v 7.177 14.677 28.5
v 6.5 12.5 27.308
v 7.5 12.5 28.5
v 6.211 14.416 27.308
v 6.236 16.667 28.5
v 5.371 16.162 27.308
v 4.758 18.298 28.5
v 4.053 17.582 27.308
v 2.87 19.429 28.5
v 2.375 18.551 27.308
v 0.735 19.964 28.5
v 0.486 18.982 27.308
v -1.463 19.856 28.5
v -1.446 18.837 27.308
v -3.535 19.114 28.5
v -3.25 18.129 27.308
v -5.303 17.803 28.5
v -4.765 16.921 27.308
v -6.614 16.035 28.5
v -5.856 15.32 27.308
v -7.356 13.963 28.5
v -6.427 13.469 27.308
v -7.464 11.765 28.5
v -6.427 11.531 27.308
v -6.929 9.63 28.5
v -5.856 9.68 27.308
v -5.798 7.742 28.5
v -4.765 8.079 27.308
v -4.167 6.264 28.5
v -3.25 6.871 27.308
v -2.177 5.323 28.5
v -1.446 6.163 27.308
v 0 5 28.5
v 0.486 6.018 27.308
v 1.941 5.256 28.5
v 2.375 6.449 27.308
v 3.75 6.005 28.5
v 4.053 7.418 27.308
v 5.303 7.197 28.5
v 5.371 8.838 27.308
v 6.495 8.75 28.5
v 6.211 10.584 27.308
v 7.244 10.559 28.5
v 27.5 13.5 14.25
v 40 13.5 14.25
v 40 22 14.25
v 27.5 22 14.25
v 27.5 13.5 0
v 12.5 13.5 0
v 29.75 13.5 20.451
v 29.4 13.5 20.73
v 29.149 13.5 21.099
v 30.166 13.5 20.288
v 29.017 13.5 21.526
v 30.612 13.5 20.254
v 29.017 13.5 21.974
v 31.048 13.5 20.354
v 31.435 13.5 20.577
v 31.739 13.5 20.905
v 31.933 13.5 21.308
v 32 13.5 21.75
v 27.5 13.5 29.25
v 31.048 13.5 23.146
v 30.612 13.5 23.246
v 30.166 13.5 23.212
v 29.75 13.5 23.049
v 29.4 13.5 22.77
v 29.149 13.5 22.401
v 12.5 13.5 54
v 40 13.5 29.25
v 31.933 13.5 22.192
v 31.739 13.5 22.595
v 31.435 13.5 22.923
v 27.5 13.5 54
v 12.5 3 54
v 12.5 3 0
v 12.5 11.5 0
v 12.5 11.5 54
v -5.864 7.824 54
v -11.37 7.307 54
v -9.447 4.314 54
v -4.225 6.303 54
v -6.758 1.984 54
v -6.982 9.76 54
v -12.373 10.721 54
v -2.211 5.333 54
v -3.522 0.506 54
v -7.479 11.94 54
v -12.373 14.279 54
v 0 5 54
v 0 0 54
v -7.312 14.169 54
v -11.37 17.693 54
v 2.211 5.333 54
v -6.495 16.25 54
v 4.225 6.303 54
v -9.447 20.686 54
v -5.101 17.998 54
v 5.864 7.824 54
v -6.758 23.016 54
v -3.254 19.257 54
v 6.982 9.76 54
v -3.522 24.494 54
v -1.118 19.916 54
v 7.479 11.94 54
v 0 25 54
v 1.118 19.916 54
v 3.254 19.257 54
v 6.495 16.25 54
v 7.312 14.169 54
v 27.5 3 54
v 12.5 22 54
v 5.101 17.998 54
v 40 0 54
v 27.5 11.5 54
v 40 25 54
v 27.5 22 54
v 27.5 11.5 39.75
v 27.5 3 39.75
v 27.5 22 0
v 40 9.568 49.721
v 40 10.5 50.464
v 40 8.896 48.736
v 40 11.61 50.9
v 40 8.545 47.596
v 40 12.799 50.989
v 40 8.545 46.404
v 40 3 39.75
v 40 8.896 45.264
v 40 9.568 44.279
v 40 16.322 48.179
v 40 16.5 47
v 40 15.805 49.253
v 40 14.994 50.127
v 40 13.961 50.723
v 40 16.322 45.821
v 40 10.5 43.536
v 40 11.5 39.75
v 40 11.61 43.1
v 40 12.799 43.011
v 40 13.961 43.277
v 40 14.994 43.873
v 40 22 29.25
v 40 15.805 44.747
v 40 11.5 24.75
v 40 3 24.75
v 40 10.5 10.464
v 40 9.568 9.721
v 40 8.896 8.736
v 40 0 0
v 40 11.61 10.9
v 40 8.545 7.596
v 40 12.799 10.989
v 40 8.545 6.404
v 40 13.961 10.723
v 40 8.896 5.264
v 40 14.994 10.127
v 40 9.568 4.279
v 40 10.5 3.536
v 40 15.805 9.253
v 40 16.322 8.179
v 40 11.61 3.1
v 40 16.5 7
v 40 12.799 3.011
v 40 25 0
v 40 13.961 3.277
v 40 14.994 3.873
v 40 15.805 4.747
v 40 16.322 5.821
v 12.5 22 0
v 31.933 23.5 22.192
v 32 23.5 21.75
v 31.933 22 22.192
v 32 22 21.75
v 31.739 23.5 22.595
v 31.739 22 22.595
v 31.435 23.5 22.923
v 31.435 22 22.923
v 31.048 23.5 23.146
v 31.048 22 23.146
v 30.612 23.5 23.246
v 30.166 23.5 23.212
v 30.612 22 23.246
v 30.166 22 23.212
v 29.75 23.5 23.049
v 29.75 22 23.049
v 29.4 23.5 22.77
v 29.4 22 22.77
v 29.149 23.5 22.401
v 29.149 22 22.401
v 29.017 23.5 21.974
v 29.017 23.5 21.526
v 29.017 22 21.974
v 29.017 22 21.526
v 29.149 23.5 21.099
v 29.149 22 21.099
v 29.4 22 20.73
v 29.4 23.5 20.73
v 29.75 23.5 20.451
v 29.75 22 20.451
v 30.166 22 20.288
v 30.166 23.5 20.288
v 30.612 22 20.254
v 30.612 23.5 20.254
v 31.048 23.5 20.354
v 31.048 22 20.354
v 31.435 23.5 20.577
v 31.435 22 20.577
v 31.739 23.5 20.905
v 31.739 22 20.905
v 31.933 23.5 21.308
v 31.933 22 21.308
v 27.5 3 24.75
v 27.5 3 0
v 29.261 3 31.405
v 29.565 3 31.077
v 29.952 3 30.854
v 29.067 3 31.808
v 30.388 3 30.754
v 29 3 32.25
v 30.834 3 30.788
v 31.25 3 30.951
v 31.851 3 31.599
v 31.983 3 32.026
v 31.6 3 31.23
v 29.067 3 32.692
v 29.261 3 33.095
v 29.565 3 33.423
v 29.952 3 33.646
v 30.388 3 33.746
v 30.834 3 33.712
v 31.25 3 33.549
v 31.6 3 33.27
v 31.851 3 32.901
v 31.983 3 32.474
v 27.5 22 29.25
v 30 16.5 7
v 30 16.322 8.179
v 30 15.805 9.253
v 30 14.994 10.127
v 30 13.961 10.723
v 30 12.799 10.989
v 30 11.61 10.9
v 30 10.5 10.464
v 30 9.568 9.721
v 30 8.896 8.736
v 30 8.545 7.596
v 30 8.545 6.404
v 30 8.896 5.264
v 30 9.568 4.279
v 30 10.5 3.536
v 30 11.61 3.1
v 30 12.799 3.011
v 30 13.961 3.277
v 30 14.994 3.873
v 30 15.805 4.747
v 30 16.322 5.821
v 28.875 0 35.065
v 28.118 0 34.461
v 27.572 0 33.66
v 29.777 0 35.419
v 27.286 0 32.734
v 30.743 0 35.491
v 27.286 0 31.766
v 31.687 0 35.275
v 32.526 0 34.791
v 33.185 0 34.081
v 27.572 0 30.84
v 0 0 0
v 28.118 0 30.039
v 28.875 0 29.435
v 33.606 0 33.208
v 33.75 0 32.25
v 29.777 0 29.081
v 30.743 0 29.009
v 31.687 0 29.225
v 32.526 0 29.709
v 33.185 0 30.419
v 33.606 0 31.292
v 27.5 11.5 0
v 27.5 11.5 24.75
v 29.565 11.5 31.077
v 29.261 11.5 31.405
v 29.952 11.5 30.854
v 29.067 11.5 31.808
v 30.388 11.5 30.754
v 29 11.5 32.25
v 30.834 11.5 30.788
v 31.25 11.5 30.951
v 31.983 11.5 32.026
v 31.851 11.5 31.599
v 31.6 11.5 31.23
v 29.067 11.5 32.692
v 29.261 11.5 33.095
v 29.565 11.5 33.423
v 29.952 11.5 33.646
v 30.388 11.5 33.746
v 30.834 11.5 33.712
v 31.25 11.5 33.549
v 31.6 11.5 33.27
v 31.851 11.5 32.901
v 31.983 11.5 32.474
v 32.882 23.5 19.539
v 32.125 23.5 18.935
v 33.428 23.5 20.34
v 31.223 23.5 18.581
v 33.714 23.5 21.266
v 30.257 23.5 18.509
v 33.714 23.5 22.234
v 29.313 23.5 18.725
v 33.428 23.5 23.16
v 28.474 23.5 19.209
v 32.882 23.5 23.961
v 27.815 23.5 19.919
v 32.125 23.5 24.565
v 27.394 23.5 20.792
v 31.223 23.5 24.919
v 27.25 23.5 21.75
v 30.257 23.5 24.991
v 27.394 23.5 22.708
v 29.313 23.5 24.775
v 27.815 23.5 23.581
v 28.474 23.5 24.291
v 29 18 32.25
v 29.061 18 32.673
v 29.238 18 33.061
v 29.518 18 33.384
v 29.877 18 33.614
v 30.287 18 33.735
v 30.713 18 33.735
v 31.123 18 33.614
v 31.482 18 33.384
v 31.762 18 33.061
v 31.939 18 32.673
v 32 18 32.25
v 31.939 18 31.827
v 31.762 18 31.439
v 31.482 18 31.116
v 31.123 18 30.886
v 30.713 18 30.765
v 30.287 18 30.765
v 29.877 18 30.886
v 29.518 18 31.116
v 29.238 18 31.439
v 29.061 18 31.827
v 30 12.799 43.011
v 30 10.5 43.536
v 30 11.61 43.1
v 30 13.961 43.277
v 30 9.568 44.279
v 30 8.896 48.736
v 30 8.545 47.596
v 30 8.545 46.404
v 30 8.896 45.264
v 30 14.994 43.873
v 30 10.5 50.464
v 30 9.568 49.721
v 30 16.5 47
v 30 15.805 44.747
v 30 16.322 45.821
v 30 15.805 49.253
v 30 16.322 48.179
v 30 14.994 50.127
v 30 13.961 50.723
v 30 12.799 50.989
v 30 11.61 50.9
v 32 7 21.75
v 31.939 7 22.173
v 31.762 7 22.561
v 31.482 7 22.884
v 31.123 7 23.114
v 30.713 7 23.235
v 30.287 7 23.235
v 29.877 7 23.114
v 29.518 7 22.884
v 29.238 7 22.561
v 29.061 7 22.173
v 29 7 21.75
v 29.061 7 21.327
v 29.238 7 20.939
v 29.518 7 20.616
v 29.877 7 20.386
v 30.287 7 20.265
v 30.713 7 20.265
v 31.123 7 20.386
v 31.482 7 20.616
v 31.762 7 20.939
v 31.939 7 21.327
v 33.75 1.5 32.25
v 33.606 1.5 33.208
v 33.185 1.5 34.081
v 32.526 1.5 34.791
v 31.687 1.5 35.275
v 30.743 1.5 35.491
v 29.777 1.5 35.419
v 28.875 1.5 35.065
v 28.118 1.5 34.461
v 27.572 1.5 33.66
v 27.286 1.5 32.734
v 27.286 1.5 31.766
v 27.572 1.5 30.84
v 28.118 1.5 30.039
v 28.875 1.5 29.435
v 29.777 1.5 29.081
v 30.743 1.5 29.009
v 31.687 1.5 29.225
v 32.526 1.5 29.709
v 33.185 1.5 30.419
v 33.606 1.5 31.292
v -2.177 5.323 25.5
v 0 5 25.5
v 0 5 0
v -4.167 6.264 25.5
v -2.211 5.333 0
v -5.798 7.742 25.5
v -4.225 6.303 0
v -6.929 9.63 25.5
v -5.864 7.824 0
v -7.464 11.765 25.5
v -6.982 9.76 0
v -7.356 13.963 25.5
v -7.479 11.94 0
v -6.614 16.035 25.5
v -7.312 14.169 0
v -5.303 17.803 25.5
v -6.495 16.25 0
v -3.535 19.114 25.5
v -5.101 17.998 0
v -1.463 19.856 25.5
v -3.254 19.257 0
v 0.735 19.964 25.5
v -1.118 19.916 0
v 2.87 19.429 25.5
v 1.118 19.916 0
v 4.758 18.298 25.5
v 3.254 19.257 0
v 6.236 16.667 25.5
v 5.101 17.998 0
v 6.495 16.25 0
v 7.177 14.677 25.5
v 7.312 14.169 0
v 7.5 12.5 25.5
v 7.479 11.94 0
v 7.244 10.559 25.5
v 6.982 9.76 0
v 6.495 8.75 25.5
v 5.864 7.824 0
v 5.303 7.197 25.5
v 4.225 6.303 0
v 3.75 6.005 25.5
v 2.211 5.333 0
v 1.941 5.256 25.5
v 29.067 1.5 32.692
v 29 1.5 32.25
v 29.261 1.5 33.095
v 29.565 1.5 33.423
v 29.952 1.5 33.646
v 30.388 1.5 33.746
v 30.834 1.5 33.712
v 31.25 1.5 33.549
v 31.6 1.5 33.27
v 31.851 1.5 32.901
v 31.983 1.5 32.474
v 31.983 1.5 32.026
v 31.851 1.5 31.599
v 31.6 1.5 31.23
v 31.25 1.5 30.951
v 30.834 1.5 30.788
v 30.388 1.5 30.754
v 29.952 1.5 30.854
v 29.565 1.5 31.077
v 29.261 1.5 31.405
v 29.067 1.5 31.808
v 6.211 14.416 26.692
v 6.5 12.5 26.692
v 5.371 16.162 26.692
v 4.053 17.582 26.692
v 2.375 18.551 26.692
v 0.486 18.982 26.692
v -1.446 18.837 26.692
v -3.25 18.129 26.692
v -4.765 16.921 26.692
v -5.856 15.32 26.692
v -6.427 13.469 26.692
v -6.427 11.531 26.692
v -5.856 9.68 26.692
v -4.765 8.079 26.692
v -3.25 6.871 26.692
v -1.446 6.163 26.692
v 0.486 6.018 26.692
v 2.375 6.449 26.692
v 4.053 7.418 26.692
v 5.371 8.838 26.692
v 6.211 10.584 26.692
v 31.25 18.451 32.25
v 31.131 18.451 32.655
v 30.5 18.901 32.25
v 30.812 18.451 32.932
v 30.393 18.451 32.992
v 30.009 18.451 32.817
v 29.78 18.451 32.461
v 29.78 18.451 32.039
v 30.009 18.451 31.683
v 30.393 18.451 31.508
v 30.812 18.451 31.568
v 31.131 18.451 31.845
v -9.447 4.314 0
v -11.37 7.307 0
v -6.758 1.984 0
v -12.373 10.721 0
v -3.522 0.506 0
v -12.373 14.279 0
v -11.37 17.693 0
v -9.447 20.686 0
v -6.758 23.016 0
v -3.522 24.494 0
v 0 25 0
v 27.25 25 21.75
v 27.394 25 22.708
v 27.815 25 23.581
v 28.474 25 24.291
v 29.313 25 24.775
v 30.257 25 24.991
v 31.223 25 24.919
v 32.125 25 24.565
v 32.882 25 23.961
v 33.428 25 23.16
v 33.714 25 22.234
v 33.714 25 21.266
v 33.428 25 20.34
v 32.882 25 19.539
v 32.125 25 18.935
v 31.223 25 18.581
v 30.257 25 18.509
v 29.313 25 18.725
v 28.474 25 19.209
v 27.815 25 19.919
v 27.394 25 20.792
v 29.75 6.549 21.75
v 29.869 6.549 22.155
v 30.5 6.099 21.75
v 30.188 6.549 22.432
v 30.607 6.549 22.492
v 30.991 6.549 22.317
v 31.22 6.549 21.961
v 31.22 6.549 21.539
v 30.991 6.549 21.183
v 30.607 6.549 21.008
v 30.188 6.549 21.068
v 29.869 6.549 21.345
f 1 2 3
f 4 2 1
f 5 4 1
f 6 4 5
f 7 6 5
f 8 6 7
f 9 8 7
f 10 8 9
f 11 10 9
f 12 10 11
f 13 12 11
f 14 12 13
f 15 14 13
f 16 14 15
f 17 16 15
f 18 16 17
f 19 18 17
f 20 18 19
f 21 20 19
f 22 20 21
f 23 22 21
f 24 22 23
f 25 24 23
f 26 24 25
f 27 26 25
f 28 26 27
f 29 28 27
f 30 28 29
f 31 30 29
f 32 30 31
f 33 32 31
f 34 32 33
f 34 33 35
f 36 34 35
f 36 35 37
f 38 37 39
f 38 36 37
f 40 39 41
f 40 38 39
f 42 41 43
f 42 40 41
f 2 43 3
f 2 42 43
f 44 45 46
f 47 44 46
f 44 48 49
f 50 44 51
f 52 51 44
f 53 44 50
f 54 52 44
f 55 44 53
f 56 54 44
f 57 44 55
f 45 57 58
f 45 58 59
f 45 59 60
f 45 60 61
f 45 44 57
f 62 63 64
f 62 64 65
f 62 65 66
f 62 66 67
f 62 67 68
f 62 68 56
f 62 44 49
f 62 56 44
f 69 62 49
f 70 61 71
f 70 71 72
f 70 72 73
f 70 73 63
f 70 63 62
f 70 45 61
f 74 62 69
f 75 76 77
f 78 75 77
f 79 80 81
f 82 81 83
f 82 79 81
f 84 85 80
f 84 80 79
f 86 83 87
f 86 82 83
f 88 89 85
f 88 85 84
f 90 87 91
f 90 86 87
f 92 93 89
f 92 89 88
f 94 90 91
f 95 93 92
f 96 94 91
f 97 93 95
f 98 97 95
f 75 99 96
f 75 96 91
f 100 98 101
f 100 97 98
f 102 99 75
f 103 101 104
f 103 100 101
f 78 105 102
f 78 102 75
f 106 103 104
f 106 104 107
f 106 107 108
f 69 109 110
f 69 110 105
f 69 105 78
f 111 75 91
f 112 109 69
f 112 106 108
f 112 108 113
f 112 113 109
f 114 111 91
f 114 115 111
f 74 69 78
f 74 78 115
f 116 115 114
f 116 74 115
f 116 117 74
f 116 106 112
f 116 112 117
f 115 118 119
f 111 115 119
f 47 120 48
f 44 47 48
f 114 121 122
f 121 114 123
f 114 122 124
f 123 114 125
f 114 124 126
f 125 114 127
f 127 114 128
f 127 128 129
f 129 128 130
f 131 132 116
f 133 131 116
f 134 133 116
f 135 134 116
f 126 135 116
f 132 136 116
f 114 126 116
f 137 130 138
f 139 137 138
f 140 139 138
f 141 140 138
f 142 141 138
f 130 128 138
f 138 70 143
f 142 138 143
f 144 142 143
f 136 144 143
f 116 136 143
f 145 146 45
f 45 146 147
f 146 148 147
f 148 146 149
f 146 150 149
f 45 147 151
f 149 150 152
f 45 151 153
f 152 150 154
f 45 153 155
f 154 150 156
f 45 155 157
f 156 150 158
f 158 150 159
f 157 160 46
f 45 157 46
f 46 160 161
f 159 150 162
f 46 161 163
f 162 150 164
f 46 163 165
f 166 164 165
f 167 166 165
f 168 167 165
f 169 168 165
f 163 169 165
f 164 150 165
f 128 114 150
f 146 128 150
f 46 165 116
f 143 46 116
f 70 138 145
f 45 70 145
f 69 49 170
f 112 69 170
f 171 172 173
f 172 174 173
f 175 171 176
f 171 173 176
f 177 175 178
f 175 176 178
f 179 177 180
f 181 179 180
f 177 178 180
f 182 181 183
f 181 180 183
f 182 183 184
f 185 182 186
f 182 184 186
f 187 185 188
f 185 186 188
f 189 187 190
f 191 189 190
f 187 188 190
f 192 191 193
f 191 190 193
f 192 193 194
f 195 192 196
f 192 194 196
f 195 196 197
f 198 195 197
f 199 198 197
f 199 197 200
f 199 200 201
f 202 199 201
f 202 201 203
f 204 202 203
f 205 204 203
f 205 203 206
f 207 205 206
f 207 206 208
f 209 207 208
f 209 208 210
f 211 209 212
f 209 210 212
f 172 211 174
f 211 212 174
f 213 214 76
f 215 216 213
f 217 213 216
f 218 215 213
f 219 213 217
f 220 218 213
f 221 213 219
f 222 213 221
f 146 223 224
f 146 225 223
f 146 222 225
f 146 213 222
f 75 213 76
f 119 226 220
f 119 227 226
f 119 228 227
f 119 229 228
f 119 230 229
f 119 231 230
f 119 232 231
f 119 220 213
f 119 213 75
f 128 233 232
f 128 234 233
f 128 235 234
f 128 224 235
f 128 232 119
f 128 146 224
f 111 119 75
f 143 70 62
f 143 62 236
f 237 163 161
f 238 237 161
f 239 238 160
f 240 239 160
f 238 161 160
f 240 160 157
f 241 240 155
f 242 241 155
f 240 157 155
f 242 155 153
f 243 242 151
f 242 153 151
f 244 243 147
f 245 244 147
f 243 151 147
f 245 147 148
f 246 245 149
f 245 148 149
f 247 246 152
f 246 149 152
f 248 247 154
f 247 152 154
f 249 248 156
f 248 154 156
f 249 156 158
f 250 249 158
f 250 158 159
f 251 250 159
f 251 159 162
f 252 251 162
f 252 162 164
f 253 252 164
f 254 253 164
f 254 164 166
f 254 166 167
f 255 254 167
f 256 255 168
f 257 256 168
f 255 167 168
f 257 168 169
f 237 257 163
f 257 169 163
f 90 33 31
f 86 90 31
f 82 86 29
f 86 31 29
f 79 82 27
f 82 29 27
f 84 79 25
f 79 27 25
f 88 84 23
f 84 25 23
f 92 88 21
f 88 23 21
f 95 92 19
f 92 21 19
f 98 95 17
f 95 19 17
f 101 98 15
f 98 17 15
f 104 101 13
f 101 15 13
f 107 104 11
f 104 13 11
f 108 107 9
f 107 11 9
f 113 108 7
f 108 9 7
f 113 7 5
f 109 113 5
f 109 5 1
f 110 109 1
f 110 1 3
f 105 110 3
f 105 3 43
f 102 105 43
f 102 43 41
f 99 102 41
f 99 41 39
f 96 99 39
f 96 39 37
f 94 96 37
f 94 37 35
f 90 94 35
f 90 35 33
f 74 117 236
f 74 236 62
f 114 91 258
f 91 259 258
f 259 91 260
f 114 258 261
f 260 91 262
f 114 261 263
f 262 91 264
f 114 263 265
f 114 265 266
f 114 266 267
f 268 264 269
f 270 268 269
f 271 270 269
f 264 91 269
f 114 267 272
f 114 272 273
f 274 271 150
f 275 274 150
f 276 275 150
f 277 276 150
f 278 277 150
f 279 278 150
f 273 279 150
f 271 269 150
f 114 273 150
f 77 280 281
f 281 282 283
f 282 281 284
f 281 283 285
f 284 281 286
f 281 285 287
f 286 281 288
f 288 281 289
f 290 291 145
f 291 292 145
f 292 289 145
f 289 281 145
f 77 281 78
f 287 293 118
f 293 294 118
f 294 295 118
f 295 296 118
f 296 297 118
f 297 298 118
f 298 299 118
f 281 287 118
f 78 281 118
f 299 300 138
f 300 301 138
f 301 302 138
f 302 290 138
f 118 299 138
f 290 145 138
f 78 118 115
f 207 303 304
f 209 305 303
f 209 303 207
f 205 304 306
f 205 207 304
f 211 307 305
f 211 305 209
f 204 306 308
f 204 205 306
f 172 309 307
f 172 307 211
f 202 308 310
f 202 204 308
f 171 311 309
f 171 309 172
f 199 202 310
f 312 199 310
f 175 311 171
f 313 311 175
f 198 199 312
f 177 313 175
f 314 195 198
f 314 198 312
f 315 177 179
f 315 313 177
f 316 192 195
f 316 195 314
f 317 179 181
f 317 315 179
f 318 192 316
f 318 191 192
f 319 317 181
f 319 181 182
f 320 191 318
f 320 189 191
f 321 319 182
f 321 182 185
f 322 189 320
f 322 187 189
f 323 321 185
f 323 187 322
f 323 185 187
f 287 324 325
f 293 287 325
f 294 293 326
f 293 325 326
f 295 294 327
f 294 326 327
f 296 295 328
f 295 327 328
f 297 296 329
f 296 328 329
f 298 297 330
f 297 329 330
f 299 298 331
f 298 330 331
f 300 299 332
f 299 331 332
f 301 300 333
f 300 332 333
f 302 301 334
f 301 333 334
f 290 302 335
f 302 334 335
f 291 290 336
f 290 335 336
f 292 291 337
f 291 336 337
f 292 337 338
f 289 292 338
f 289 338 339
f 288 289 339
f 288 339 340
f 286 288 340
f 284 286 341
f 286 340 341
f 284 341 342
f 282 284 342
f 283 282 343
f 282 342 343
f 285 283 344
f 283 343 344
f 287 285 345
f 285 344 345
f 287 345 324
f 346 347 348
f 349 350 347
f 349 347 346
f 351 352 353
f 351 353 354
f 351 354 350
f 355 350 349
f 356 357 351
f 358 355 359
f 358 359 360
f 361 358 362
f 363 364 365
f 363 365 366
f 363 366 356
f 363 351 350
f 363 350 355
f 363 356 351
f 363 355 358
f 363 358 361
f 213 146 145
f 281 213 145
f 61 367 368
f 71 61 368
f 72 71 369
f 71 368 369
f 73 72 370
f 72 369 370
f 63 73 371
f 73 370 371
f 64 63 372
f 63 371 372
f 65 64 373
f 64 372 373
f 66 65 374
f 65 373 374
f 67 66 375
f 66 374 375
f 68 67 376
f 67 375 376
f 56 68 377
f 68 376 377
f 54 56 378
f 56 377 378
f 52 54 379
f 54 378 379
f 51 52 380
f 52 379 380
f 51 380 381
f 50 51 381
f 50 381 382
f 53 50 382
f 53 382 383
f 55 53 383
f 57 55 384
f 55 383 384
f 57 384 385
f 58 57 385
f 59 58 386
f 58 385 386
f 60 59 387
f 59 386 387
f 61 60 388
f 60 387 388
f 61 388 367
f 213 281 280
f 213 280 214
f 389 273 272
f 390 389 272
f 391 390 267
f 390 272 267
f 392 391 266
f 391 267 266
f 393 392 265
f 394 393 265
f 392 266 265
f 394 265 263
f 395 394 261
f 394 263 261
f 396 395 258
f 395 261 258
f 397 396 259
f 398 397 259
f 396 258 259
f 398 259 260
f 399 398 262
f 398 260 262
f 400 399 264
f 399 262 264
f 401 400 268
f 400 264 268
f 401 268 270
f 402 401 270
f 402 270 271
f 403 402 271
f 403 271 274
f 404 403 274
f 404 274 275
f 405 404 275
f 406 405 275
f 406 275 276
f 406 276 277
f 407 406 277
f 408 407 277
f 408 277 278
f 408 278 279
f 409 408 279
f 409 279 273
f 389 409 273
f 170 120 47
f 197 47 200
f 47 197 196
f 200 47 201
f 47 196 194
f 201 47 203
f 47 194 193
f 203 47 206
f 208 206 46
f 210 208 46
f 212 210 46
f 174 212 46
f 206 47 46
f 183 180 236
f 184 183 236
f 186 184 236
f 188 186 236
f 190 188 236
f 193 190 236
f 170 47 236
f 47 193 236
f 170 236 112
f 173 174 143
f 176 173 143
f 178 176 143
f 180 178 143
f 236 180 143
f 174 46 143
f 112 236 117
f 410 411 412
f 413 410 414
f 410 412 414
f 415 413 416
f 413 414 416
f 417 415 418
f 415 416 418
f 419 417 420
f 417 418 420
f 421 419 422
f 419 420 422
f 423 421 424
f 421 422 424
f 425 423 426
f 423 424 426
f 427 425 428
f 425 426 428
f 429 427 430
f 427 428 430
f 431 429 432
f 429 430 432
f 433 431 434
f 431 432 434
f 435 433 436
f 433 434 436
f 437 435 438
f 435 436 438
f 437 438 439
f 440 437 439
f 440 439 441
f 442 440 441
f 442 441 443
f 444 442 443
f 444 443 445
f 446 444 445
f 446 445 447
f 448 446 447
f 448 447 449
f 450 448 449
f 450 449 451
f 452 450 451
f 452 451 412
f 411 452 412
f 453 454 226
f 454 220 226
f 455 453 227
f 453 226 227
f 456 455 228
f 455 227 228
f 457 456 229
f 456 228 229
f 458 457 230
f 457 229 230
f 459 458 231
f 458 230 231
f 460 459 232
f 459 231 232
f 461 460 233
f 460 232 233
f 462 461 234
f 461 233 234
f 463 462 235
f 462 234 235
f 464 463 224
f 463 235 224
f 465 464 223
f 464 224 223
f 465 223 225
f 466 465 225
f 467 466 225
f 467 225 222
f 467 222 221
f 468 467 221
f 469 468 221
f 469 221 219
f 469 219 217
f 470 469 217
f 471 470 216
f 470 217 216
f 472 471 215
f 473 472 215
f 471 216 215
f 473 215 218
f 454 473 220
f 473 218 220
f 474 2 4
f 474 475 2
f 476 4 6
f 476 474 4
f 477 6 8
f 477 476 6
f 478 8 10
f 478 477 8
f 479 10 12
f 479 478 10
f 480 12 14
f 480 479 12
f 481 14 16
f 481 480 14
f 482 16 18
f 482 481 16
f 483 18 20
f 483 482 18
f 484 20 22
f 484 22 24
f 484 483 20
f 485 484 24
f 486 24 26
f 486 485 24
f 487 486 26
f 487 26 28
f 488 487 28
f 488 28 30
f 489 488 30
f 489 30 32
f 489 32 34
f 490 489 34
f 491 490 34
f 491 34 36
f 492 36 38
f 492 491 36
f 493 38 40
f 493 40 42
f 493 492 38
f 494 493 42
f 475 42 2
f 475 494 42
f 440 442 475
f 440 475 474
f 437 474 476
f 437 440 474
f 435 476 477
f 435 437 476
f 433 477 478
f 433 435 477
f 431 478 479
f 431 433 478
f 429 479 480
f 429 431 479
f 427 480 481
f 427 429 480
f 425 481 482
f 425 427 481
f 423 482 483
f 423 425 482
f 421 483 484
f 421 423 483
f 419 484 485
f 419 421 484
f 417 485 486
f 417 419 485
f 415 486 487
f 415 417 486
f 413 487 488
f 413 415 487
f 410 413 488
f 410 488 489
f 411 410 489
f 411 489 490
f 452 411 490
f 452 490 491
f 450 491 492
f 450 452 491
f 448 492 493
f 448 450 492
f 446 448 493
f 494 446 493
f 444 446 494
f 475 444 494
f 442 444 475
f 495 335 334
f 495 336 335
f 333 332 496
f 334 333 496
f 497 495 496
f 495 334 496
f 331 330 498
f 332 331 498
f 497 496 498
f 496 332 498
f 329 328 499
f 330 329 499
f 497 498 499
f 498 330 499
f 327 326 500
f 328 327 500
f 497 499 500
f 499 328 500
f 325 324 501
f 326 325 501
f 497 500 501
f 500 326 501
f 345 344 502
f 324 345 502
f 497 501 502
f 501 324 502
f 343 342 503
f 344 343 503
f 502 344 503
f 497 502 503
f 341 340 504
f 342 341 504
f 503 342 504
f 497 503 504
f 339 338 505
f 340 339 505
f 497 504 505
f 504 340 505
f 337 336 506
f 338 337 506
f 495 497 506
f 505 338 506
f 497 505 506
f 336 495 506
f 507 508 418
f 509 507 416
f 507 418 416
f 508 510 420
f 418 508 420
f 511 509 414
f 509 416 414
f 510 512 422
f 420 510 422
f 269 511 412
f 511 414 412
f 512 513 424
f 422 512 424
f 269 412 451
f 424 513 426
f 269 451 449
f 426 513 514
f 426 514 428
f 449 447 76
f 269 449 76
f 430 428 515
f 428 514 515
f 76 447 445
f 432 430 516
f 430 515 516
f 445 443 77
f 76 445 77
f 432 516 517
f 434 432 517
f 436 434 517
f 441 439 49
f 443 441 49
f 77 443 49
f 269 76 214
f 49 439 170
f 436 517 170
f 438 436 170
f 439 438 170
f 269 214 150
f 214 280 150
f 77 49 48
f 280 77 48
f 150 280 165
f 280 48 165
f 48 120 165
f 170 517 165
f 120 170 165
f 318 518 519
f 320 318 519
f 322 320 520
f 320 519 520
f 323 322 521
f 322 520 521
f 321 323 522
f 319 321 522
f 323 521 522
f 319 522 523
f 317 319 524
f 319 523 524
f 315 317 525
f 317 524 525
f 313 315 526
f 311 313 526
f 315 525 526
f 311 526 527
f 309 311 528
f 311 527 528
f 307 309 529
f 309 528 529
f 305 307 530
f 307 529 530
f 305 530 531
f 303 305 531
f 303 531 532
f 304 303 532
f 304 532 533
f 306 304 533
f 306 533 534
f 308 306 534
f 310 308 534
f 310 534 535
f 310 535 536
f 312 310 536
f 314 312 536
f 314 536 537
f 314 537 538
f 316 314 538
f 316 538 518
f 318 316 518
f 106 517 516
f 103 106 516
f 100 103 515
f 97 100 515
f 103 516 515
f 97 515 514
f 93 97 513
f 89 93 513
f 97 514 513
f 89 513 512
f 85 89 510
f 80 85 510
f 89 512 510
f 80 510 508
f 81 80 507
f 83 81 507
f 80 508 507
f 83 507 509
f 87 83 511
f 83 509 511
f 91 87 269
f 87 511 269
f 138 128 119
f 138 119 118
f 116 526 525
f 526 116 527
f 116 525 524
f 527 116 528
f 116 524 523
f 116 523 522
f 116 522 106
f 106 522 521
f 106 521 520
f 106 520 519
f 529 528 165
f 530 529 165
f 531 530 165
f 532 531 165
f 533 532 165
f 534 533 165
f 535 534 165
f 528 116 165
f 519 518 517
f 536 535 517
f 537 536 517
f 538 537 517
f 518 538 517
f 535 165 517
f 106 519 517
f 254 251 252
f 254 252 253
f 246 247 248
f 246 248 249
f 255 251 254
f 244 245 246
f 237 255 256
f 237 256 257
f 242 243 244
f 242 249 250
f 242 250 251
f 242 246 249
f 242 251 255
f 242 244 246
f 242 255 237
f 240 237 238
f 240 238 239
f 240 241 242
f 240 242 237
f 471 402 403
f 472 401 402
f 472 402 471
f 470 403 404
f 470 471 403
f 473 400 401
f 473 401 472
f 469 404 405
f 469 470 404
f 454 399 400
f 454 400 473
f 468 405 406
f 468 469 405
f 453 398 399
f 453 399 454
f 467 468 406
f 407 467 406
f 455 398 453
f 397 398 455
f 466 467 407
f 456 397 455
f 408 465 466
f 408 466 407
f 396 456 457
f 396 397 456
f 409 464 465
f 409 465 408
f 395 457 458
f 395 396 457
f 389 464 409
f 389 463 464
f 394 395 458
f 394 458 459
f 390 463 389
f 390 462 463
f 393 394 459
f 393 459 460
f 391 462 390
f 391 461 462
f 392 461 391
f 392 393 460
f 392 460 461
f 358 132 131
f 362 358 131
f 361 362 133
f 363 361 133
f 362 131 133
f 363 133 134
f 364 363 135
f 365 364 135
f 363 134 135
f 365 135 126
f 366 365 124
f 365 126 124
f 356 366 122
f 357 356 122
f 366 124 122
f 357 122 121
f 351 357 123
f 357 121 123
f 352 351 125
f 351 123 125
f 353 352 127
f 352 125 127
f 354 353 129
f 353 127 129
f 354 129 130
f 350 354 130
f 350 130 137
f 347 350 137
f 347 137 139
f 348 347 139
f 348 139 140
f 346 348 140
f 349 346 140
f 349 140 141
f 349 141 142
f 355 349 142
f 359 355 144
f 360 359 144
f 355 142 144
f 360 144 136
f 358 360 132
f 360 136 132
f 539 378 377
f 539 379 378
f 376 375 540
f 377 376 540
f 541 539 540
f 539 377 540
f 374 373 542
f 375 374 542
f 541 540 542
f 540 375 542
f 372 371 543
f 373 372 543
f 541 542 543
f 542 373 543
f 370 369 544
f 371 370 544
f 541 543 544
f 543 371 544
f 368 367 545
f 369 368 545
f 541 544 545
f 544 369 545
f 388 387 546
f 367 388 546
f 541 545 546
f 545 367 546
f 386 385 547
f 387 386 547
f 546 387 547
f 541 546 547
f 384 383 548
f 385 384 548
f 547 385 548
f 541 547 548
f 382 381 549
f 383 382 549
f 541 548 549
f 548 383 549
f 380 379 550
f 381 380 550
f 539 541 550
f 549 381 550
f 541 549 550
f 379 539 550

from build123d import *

# Parameters (mm, degrees)
F0_W           = 15
F0_H           = 2
F1_DEPTH       = 54
F2_W           = 8.5
F2_H           = 15
F3_DEPTH       = 12.5
F5_D           = 3
F5_DEPTH       = 18
F5_CBORE_D     = 6.5
F5_CBORE_DEPTH = 1.5
F5_TIP         = 0.9012909285
F7_D           = 3
F7_DEPTH       = 18
F7_CBORE_D     = 6.5
F7_CBORE_DEPTH = 1.5
F7_TIP         = 0.9012909285
F8_R           = 4
F9_DEPTH       = 10


with BuildPart() as f1:
    # F0 (on Top) → F1 (new body)
    with BuildSketch(Plane.XY):
        with BuildLine():
            Line((0, 5), (0, 0))
            Line((0, 0), (40, 0))
            Line((40, 0), (40, 25))
            Line((40, 25), (0, 25))
            Line((0, 25), (0, 20))
            ThreePointArc((0, 20), (5.3033008589, 17.8033008589), (7.5, 12.5))
            ThreePointArc((7.5, 12.5), (5.3033008589, 7.1966991411), (0, 5))
        make_face()
        Polygon((12.5, 13.5), (12.5, 22), (27.5, 22), (27.5, 13.5), (27.5, 11.5), (27.5, 3), (12.5, 3), (12.5, 11.5), align=None, mode=Mode.SUBTRACT)
        with BuildLine():
            ThreePointArc((0, 25), (-12.5, 12.5), (0, 0))
            Line((0, 0), (0, 5))
            ThreePointArc((0, 5), (-7.5, 12.5), (0, 20))
            Line((0, 20), (0, 25))
        make_face()
        with Locations((20, 12.5)):
            Rectangle(F0_W, F0_H)
    extrude(amount=F1_DEPTH)

    # F2 (on face) → F3 (cut, through all)
    with BuildSketch(Plane.YZ.offset(40)):
        with Locations((7.25, 32.25)):
            Rectangle(F2_W, F2_H)
        with Locations((17.75, 21.75)):
            Rectangle(F2_W, F2_H)
    extrude(amount=-F3_DEPTH, mode=Mode.SUBTRACT)

    # F5
    with Locations(Plane.XZ):
        with Locations((30.5, 32.25)):
            CounterBoreHole(F5_D / 2, F5_CBORE_D / 2, F5_CBORE_DEPTH, depth=F5_DEPTH)
            with Locations((0, 0, -(F5_DEPTH + F5_TIP / 2))):  # 118° drill point
                Cone(0, F5_D / 2, F5_TIP, mode=Mode.SUBTRACT)

    # F7
    with Locations(Plane(origin=(0, 25, 0), x_dir=(-1, 0, 0), z_dir=(0, 1, 0))):
        with Locations((-30.5, 21.75)):
            CounterBoreHole(F7_D / 2, F7_CBORE_D / 2, F7_CBORE_DEPTH, depth=F7_DEPTH)
            with Locations((0, 0, -(F7_DEPTH + F7_TIP / 2))):  # 118° drill point
                Cone(0, F7_D / 2, F7_TIP, mode=Mode.SUBTRACT)

    # F8 (on face) → F9 (cut)
    with BuildSketch(Plane.YZ.offset(40)):
        with Locations((12.5, 47)):
            Circle(F8_R)
        with Locations((12.5, 7)):
            Circle(F8_R)
    extrude(amount=-F9_DEPTH, mode=Mode.SUBTRACT)

    # F11 (on offset) → F12 (revolve)
    with BuildSketch(Plane.XZ.offset(-12.5)):
        Polygon((6.5, 26.6917535926), (7.5, 25.5), (7.5, 28.5), (6.5, 27.3082464074), align=None)
    revolve(axis=Axis((0, 12.5, 27), (0, 0, 1)))


solid = f1.part
